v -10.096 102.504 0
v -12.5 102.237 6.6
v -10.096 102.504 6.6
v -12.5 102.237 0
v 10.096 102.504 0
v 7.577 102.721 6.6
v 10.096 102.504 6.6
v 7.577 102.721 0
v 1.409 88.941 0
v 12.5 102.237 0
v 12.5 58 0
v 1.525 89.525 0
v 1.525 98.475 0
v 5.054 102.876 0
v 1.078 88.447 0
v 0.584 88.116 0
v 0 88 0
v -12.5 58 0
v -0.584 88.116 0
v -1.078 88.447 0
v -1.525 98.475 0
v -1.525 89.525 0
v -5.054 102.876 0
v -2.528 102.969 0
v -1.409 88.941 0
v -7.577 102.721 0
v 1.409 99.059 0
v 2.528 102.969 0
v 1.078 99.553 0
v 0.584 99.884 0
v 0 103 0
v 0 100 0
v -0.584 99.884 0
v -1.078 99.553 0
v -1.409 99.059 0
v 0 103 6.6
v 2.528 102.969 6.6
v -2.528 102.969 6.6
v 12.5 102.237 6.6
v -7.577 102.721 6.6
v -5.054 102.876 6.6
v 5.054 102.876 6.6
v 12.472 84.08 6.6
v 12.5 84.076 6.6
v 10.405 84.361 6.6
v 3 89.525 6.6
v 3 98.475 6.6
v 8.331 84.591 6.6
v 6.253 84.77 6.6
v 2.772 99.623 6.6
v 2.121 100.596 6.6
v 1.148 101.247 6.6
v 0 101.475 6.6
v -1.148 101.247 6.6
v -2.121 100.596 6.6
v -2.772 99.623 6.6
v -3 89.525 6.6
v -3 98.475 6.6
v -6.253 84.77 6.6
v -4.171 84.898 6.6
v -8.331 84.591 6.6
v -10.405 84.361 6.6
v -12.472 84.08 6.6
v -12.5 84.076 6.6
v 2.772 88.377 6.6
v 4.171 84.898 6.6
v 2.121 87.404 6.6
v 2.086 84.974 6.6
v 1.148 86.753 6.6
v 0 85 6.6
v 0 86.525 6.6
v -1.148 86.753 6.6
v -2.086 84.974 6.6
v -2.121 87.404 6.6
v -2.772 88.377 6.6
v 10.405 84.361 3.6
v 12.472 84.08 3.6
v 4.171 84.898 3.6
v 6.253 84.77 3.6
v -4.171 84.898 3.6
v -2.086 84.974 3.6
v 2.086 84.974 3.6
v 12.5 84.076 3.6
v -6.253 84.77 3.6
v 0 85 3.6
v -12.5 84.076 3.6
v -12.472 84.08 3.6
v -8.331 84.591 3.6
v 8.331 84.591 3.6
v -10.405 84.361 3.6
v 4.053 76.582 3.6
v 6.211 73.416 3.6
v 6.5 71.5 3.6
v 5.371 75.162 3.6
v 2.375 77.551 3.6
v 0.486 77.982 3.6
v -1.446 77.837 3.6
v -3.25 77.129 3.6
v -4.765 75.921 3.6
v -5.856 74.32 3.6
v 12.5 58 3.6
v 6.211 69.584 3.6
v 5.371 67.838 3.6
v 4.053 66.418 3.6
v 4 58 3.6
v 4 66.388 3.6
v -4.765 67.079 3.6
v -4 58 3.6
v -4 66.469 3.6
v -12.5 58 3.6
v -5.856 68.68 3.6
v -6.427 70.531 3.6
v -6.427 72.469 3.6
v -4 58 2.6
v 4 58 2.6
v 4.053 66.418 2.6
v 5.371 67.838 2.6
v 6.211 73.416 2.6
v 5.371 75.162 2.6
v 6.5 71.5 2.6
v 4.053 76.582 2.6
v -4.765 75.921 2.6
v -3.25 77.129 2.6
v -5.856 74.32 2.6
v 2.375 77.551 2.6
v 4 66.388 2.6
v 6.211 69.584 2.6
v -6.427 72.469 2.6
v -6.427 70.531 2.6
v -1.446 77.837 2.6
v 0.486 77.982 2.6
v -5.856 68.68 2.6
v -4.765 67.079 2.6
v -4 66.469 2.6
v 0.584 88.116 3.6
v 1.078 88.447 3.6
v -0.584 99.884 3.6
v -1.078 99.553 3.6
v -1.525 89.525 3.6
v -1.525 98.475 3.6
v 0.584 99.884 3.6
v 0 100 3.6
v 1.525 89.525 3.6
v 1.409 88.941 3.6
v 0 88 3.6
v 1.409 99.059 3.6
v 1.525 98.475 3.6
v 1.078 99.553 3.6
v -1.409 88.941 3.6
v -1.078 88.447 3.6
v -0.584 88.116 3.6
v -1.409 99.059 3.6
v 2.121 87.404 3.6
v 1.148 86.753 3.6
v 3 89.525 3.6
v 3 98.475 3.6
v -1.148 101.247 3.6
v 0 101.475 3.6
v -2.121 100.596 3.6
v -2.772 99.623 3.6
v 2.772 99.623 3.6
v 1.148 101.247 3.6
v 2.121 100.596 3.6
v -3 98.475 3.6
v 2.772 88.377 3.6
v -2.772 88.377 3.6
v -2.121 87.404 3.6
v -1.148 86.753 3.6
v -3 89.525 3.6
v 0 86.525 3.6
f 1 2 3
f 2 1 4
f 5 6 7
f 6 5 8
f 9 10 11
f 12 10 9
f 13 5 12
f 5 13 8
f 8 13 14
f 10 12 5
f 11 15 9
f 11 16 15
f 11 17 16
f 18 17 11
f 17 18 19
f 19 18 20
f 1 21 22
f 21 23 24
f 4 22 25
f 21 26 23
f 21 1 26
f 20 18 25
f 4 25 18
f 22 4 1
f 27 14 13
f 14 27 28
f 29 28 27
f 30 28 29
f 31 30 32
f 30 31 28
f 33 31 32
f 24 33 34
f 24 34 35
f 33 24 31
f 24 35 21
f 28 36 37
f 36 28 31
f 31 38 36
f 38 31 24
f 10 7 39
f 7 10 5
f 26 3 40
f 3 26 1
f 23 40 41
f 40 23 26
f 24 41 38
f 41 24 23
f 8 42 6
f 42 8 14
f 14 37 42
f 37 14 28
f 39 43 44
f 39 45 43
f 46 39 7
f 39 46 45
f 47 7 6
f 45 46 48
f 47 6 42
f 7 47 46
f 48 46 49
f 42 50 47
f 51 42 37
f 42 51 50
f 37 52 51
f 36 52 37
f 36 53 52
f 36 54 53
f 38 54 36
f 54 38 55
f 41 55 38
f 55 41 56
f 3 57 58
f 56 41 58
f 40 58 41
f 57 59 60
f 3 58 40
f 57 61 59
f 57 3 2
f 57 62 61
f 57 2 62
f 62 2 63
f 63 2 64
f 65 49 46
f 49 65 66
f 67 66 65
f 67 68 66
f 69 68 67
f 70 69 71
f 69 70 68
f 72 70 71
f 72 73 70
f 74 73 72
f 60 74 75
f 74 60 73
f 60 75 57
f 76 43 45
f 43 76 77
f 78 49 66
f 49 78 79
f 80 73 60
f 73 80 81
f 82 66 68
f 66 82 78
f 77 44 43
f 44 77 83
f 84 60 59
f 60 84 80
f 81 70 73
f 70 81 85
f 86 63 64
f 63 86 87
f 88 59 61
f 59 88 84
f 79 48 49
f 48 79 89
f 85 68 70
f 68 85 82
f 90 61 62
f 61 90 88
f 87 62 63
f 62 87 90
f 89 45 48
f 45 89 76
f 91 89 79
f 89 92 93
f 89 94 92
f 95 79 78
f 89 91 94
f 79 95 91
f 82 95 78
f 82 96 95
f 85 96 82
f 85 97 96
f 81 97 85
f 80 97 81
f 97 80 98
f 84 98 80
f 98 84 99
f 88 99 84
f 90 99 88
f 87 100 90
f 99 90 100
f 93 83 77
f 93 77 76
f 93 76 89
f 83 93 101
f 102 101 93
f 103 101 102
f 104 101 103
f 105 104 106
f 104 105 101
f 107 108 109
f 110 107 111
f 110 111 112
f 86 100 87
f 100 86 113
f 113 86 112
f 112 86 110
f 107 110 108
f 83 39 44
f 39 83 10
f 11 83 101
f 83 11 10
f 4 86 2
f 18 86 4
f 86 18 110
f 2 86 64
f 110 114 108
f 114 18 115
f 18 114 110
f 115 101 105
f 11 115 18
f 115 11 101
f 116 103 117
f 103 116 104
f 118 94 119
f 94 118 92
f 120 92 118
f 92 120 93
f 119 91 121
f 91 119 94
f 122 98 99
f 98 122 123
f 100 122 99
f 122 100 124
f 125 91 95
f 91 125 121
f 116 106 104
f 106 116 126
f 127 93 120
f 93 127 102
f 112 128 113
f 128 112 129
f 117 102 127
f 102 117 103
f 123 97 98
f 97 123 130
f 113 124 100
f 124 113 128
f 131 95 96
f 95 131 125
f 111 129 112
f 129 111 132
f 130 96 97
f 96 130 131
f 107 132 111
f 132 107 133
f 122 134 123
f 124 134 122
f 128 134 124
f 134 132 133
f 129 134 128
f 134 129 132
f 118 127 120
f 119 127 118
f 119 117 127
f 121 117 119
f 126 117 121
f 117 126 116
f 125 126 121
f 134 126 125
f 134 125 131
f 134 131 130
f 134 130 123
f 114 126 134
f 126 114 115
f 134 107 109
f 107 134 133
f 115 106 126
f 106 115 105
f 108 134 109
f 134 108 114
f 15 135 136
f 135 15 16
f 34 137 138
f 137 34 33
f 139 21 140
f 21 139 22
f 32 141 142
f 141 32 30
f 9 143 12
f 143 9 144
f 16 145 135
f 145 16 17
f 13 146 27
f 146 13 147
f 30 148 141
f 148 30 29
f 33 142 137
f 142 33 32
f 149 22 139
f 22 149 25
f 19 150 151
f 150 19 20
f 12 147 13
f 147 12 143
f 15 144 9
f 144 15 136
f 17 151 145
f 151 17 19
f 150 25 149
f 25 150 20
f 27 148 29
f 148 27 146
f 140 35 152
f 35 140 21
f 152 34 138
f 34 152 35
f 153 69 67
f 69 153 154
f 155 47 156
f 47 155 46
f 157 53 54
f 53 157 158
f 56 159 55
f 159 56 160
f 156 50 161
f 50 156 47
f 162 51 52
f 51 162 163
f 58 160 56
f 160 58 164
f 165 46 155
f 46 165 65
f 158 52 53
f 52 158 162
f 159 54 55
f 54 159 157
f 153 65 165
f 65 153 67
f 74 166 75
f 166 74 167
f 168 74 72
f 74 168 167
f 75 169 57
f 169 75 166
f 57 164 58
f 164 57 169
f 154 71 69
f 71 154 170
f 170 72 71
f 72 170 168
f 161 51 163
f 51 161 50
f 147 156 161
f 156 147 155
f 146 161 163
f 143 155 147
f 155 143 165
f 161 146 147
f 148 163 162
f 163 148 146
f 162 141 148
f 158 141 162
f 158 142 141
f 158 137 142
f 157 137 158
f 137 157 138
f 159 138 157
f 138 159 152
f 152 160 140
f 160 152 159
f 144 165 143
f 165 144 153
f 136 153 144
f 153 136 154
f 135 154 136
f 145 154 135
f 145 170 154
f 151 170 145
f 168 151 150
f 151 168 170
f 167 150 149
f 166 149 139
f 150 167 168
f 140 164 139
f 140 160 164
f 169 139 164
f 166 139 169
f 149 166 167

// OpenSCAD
// file: configuration.scad
// Increase this if your slicer or printer make holes too tight.
extra_radius = 0.1;
extra_extrusion_width = 0.5;

// OD = outside diameter, corner to corner.
m3_nut_od = 6.1;
m3_nut_radius = m3_nut_od/2 + 0.35 + extra_radius;
m3_washer_radius = 3.5 + extra_radius;

// Major diameter of metric 3mm thread.
m3_major = 2.85;
m3_radius = m3_major/2 + extra_radius;
m3_wide_radius = m3_major/2 + extra_radius;

// NEMA17 stepper motors.
motor_shaft_diameter = 5;
motor_shaft_radius = motor_shaft_diameter/2 + extra_radius;

// Frame brackets. M3x8mm screws work best with 3.6 mm brackets.
thickness = 3.6;

// OpenBeam or Misumi. Currently only 15x15 mm, but there is a plan
// to make models more parametric and allow 20x20 mm in the future.
extrusion = 15;

// Placement for the NEMA17 stepper motors.
motor_offset = 44;
motor_length = 47;
// main file
include <configuration.scad>;

tab_length = 45;
tab_width = 25;
tab_thickness = 3.6;
glass_thickness = 3.0; 
glass_radius = 85.0;
guard_thickness = 18;

fsr_radius = 6.5;
fsr_recess = 1.0;
fsr_connector_width = 8.0;

m3_head_radius = 3.0;
ridge_length = 12;


//The basic glass tab
module glass_tab_base(){
	intersection(){
		difference(){
			cylinder(r=glass_radius+guard_thickness, h=glass_thickness+tab_thickness, $fn=256);
			translate([0, 0, tab_thickness])
				cylinder(r=glass_radius, h=10, center=false, $fn=256);
		}
		translate([-tab_width/2,(glass_radius+guard_thickness)-tab_length,0])
			cube([tab_width, (glass_radius+guard_thickness), glass_thickness+tab_thickness]);
	}
}


//..with added FSR recess
module glass_tab_recess(){
	difference(){
		glass_tab_base();
		translate([0,(glass_radius+guard_thickness)-((tab_length+guard_thickness)/2),tab_thickness-fsr_recess])
			cylinder(r=fsr_radius, h=10);
		translate([-fsr_connector_width/2,0,tab_thickness-fsr_recess])
			cube([fsr_connector_width,(glass_radius+guard_thickness)-((tab_length+guard_thickness)/2),10]);
	}
}


//..and mounting hole
module glass_tab(){
	difference(){
		glass_tab_recess();
		hull(){
			translate([0,glass_radius+(guard_thickness/2)-(ridge_length/2)+m3_wide_radius,-1])
				cylinder(r=m3_wide_radius, h = 20, $fn=16);
			translate([0,glass_radius+(guard_thickness/2)+(ridge_length/2)-m3_wide_radius,-1])
				cylinder(r=m3_wide_radius, h = 20, $fn=16);
		}
		hull(){
			translate([0,glass_radius+(guard_thickness/2)-(ridge_length/2)+m3_wide_radius,tab_thickness])
				cylinder(r=m3_head_radius, h = 20, $fn=16);
			translate([0,glass_radius+(guard_thickness/2)+(ridge_length/2)-m3_wide_radius,tab_thickness])
				cylinder(r=m3_head_radius, h = 20, $fn=16);
		}
	}
}

glass_tab();
